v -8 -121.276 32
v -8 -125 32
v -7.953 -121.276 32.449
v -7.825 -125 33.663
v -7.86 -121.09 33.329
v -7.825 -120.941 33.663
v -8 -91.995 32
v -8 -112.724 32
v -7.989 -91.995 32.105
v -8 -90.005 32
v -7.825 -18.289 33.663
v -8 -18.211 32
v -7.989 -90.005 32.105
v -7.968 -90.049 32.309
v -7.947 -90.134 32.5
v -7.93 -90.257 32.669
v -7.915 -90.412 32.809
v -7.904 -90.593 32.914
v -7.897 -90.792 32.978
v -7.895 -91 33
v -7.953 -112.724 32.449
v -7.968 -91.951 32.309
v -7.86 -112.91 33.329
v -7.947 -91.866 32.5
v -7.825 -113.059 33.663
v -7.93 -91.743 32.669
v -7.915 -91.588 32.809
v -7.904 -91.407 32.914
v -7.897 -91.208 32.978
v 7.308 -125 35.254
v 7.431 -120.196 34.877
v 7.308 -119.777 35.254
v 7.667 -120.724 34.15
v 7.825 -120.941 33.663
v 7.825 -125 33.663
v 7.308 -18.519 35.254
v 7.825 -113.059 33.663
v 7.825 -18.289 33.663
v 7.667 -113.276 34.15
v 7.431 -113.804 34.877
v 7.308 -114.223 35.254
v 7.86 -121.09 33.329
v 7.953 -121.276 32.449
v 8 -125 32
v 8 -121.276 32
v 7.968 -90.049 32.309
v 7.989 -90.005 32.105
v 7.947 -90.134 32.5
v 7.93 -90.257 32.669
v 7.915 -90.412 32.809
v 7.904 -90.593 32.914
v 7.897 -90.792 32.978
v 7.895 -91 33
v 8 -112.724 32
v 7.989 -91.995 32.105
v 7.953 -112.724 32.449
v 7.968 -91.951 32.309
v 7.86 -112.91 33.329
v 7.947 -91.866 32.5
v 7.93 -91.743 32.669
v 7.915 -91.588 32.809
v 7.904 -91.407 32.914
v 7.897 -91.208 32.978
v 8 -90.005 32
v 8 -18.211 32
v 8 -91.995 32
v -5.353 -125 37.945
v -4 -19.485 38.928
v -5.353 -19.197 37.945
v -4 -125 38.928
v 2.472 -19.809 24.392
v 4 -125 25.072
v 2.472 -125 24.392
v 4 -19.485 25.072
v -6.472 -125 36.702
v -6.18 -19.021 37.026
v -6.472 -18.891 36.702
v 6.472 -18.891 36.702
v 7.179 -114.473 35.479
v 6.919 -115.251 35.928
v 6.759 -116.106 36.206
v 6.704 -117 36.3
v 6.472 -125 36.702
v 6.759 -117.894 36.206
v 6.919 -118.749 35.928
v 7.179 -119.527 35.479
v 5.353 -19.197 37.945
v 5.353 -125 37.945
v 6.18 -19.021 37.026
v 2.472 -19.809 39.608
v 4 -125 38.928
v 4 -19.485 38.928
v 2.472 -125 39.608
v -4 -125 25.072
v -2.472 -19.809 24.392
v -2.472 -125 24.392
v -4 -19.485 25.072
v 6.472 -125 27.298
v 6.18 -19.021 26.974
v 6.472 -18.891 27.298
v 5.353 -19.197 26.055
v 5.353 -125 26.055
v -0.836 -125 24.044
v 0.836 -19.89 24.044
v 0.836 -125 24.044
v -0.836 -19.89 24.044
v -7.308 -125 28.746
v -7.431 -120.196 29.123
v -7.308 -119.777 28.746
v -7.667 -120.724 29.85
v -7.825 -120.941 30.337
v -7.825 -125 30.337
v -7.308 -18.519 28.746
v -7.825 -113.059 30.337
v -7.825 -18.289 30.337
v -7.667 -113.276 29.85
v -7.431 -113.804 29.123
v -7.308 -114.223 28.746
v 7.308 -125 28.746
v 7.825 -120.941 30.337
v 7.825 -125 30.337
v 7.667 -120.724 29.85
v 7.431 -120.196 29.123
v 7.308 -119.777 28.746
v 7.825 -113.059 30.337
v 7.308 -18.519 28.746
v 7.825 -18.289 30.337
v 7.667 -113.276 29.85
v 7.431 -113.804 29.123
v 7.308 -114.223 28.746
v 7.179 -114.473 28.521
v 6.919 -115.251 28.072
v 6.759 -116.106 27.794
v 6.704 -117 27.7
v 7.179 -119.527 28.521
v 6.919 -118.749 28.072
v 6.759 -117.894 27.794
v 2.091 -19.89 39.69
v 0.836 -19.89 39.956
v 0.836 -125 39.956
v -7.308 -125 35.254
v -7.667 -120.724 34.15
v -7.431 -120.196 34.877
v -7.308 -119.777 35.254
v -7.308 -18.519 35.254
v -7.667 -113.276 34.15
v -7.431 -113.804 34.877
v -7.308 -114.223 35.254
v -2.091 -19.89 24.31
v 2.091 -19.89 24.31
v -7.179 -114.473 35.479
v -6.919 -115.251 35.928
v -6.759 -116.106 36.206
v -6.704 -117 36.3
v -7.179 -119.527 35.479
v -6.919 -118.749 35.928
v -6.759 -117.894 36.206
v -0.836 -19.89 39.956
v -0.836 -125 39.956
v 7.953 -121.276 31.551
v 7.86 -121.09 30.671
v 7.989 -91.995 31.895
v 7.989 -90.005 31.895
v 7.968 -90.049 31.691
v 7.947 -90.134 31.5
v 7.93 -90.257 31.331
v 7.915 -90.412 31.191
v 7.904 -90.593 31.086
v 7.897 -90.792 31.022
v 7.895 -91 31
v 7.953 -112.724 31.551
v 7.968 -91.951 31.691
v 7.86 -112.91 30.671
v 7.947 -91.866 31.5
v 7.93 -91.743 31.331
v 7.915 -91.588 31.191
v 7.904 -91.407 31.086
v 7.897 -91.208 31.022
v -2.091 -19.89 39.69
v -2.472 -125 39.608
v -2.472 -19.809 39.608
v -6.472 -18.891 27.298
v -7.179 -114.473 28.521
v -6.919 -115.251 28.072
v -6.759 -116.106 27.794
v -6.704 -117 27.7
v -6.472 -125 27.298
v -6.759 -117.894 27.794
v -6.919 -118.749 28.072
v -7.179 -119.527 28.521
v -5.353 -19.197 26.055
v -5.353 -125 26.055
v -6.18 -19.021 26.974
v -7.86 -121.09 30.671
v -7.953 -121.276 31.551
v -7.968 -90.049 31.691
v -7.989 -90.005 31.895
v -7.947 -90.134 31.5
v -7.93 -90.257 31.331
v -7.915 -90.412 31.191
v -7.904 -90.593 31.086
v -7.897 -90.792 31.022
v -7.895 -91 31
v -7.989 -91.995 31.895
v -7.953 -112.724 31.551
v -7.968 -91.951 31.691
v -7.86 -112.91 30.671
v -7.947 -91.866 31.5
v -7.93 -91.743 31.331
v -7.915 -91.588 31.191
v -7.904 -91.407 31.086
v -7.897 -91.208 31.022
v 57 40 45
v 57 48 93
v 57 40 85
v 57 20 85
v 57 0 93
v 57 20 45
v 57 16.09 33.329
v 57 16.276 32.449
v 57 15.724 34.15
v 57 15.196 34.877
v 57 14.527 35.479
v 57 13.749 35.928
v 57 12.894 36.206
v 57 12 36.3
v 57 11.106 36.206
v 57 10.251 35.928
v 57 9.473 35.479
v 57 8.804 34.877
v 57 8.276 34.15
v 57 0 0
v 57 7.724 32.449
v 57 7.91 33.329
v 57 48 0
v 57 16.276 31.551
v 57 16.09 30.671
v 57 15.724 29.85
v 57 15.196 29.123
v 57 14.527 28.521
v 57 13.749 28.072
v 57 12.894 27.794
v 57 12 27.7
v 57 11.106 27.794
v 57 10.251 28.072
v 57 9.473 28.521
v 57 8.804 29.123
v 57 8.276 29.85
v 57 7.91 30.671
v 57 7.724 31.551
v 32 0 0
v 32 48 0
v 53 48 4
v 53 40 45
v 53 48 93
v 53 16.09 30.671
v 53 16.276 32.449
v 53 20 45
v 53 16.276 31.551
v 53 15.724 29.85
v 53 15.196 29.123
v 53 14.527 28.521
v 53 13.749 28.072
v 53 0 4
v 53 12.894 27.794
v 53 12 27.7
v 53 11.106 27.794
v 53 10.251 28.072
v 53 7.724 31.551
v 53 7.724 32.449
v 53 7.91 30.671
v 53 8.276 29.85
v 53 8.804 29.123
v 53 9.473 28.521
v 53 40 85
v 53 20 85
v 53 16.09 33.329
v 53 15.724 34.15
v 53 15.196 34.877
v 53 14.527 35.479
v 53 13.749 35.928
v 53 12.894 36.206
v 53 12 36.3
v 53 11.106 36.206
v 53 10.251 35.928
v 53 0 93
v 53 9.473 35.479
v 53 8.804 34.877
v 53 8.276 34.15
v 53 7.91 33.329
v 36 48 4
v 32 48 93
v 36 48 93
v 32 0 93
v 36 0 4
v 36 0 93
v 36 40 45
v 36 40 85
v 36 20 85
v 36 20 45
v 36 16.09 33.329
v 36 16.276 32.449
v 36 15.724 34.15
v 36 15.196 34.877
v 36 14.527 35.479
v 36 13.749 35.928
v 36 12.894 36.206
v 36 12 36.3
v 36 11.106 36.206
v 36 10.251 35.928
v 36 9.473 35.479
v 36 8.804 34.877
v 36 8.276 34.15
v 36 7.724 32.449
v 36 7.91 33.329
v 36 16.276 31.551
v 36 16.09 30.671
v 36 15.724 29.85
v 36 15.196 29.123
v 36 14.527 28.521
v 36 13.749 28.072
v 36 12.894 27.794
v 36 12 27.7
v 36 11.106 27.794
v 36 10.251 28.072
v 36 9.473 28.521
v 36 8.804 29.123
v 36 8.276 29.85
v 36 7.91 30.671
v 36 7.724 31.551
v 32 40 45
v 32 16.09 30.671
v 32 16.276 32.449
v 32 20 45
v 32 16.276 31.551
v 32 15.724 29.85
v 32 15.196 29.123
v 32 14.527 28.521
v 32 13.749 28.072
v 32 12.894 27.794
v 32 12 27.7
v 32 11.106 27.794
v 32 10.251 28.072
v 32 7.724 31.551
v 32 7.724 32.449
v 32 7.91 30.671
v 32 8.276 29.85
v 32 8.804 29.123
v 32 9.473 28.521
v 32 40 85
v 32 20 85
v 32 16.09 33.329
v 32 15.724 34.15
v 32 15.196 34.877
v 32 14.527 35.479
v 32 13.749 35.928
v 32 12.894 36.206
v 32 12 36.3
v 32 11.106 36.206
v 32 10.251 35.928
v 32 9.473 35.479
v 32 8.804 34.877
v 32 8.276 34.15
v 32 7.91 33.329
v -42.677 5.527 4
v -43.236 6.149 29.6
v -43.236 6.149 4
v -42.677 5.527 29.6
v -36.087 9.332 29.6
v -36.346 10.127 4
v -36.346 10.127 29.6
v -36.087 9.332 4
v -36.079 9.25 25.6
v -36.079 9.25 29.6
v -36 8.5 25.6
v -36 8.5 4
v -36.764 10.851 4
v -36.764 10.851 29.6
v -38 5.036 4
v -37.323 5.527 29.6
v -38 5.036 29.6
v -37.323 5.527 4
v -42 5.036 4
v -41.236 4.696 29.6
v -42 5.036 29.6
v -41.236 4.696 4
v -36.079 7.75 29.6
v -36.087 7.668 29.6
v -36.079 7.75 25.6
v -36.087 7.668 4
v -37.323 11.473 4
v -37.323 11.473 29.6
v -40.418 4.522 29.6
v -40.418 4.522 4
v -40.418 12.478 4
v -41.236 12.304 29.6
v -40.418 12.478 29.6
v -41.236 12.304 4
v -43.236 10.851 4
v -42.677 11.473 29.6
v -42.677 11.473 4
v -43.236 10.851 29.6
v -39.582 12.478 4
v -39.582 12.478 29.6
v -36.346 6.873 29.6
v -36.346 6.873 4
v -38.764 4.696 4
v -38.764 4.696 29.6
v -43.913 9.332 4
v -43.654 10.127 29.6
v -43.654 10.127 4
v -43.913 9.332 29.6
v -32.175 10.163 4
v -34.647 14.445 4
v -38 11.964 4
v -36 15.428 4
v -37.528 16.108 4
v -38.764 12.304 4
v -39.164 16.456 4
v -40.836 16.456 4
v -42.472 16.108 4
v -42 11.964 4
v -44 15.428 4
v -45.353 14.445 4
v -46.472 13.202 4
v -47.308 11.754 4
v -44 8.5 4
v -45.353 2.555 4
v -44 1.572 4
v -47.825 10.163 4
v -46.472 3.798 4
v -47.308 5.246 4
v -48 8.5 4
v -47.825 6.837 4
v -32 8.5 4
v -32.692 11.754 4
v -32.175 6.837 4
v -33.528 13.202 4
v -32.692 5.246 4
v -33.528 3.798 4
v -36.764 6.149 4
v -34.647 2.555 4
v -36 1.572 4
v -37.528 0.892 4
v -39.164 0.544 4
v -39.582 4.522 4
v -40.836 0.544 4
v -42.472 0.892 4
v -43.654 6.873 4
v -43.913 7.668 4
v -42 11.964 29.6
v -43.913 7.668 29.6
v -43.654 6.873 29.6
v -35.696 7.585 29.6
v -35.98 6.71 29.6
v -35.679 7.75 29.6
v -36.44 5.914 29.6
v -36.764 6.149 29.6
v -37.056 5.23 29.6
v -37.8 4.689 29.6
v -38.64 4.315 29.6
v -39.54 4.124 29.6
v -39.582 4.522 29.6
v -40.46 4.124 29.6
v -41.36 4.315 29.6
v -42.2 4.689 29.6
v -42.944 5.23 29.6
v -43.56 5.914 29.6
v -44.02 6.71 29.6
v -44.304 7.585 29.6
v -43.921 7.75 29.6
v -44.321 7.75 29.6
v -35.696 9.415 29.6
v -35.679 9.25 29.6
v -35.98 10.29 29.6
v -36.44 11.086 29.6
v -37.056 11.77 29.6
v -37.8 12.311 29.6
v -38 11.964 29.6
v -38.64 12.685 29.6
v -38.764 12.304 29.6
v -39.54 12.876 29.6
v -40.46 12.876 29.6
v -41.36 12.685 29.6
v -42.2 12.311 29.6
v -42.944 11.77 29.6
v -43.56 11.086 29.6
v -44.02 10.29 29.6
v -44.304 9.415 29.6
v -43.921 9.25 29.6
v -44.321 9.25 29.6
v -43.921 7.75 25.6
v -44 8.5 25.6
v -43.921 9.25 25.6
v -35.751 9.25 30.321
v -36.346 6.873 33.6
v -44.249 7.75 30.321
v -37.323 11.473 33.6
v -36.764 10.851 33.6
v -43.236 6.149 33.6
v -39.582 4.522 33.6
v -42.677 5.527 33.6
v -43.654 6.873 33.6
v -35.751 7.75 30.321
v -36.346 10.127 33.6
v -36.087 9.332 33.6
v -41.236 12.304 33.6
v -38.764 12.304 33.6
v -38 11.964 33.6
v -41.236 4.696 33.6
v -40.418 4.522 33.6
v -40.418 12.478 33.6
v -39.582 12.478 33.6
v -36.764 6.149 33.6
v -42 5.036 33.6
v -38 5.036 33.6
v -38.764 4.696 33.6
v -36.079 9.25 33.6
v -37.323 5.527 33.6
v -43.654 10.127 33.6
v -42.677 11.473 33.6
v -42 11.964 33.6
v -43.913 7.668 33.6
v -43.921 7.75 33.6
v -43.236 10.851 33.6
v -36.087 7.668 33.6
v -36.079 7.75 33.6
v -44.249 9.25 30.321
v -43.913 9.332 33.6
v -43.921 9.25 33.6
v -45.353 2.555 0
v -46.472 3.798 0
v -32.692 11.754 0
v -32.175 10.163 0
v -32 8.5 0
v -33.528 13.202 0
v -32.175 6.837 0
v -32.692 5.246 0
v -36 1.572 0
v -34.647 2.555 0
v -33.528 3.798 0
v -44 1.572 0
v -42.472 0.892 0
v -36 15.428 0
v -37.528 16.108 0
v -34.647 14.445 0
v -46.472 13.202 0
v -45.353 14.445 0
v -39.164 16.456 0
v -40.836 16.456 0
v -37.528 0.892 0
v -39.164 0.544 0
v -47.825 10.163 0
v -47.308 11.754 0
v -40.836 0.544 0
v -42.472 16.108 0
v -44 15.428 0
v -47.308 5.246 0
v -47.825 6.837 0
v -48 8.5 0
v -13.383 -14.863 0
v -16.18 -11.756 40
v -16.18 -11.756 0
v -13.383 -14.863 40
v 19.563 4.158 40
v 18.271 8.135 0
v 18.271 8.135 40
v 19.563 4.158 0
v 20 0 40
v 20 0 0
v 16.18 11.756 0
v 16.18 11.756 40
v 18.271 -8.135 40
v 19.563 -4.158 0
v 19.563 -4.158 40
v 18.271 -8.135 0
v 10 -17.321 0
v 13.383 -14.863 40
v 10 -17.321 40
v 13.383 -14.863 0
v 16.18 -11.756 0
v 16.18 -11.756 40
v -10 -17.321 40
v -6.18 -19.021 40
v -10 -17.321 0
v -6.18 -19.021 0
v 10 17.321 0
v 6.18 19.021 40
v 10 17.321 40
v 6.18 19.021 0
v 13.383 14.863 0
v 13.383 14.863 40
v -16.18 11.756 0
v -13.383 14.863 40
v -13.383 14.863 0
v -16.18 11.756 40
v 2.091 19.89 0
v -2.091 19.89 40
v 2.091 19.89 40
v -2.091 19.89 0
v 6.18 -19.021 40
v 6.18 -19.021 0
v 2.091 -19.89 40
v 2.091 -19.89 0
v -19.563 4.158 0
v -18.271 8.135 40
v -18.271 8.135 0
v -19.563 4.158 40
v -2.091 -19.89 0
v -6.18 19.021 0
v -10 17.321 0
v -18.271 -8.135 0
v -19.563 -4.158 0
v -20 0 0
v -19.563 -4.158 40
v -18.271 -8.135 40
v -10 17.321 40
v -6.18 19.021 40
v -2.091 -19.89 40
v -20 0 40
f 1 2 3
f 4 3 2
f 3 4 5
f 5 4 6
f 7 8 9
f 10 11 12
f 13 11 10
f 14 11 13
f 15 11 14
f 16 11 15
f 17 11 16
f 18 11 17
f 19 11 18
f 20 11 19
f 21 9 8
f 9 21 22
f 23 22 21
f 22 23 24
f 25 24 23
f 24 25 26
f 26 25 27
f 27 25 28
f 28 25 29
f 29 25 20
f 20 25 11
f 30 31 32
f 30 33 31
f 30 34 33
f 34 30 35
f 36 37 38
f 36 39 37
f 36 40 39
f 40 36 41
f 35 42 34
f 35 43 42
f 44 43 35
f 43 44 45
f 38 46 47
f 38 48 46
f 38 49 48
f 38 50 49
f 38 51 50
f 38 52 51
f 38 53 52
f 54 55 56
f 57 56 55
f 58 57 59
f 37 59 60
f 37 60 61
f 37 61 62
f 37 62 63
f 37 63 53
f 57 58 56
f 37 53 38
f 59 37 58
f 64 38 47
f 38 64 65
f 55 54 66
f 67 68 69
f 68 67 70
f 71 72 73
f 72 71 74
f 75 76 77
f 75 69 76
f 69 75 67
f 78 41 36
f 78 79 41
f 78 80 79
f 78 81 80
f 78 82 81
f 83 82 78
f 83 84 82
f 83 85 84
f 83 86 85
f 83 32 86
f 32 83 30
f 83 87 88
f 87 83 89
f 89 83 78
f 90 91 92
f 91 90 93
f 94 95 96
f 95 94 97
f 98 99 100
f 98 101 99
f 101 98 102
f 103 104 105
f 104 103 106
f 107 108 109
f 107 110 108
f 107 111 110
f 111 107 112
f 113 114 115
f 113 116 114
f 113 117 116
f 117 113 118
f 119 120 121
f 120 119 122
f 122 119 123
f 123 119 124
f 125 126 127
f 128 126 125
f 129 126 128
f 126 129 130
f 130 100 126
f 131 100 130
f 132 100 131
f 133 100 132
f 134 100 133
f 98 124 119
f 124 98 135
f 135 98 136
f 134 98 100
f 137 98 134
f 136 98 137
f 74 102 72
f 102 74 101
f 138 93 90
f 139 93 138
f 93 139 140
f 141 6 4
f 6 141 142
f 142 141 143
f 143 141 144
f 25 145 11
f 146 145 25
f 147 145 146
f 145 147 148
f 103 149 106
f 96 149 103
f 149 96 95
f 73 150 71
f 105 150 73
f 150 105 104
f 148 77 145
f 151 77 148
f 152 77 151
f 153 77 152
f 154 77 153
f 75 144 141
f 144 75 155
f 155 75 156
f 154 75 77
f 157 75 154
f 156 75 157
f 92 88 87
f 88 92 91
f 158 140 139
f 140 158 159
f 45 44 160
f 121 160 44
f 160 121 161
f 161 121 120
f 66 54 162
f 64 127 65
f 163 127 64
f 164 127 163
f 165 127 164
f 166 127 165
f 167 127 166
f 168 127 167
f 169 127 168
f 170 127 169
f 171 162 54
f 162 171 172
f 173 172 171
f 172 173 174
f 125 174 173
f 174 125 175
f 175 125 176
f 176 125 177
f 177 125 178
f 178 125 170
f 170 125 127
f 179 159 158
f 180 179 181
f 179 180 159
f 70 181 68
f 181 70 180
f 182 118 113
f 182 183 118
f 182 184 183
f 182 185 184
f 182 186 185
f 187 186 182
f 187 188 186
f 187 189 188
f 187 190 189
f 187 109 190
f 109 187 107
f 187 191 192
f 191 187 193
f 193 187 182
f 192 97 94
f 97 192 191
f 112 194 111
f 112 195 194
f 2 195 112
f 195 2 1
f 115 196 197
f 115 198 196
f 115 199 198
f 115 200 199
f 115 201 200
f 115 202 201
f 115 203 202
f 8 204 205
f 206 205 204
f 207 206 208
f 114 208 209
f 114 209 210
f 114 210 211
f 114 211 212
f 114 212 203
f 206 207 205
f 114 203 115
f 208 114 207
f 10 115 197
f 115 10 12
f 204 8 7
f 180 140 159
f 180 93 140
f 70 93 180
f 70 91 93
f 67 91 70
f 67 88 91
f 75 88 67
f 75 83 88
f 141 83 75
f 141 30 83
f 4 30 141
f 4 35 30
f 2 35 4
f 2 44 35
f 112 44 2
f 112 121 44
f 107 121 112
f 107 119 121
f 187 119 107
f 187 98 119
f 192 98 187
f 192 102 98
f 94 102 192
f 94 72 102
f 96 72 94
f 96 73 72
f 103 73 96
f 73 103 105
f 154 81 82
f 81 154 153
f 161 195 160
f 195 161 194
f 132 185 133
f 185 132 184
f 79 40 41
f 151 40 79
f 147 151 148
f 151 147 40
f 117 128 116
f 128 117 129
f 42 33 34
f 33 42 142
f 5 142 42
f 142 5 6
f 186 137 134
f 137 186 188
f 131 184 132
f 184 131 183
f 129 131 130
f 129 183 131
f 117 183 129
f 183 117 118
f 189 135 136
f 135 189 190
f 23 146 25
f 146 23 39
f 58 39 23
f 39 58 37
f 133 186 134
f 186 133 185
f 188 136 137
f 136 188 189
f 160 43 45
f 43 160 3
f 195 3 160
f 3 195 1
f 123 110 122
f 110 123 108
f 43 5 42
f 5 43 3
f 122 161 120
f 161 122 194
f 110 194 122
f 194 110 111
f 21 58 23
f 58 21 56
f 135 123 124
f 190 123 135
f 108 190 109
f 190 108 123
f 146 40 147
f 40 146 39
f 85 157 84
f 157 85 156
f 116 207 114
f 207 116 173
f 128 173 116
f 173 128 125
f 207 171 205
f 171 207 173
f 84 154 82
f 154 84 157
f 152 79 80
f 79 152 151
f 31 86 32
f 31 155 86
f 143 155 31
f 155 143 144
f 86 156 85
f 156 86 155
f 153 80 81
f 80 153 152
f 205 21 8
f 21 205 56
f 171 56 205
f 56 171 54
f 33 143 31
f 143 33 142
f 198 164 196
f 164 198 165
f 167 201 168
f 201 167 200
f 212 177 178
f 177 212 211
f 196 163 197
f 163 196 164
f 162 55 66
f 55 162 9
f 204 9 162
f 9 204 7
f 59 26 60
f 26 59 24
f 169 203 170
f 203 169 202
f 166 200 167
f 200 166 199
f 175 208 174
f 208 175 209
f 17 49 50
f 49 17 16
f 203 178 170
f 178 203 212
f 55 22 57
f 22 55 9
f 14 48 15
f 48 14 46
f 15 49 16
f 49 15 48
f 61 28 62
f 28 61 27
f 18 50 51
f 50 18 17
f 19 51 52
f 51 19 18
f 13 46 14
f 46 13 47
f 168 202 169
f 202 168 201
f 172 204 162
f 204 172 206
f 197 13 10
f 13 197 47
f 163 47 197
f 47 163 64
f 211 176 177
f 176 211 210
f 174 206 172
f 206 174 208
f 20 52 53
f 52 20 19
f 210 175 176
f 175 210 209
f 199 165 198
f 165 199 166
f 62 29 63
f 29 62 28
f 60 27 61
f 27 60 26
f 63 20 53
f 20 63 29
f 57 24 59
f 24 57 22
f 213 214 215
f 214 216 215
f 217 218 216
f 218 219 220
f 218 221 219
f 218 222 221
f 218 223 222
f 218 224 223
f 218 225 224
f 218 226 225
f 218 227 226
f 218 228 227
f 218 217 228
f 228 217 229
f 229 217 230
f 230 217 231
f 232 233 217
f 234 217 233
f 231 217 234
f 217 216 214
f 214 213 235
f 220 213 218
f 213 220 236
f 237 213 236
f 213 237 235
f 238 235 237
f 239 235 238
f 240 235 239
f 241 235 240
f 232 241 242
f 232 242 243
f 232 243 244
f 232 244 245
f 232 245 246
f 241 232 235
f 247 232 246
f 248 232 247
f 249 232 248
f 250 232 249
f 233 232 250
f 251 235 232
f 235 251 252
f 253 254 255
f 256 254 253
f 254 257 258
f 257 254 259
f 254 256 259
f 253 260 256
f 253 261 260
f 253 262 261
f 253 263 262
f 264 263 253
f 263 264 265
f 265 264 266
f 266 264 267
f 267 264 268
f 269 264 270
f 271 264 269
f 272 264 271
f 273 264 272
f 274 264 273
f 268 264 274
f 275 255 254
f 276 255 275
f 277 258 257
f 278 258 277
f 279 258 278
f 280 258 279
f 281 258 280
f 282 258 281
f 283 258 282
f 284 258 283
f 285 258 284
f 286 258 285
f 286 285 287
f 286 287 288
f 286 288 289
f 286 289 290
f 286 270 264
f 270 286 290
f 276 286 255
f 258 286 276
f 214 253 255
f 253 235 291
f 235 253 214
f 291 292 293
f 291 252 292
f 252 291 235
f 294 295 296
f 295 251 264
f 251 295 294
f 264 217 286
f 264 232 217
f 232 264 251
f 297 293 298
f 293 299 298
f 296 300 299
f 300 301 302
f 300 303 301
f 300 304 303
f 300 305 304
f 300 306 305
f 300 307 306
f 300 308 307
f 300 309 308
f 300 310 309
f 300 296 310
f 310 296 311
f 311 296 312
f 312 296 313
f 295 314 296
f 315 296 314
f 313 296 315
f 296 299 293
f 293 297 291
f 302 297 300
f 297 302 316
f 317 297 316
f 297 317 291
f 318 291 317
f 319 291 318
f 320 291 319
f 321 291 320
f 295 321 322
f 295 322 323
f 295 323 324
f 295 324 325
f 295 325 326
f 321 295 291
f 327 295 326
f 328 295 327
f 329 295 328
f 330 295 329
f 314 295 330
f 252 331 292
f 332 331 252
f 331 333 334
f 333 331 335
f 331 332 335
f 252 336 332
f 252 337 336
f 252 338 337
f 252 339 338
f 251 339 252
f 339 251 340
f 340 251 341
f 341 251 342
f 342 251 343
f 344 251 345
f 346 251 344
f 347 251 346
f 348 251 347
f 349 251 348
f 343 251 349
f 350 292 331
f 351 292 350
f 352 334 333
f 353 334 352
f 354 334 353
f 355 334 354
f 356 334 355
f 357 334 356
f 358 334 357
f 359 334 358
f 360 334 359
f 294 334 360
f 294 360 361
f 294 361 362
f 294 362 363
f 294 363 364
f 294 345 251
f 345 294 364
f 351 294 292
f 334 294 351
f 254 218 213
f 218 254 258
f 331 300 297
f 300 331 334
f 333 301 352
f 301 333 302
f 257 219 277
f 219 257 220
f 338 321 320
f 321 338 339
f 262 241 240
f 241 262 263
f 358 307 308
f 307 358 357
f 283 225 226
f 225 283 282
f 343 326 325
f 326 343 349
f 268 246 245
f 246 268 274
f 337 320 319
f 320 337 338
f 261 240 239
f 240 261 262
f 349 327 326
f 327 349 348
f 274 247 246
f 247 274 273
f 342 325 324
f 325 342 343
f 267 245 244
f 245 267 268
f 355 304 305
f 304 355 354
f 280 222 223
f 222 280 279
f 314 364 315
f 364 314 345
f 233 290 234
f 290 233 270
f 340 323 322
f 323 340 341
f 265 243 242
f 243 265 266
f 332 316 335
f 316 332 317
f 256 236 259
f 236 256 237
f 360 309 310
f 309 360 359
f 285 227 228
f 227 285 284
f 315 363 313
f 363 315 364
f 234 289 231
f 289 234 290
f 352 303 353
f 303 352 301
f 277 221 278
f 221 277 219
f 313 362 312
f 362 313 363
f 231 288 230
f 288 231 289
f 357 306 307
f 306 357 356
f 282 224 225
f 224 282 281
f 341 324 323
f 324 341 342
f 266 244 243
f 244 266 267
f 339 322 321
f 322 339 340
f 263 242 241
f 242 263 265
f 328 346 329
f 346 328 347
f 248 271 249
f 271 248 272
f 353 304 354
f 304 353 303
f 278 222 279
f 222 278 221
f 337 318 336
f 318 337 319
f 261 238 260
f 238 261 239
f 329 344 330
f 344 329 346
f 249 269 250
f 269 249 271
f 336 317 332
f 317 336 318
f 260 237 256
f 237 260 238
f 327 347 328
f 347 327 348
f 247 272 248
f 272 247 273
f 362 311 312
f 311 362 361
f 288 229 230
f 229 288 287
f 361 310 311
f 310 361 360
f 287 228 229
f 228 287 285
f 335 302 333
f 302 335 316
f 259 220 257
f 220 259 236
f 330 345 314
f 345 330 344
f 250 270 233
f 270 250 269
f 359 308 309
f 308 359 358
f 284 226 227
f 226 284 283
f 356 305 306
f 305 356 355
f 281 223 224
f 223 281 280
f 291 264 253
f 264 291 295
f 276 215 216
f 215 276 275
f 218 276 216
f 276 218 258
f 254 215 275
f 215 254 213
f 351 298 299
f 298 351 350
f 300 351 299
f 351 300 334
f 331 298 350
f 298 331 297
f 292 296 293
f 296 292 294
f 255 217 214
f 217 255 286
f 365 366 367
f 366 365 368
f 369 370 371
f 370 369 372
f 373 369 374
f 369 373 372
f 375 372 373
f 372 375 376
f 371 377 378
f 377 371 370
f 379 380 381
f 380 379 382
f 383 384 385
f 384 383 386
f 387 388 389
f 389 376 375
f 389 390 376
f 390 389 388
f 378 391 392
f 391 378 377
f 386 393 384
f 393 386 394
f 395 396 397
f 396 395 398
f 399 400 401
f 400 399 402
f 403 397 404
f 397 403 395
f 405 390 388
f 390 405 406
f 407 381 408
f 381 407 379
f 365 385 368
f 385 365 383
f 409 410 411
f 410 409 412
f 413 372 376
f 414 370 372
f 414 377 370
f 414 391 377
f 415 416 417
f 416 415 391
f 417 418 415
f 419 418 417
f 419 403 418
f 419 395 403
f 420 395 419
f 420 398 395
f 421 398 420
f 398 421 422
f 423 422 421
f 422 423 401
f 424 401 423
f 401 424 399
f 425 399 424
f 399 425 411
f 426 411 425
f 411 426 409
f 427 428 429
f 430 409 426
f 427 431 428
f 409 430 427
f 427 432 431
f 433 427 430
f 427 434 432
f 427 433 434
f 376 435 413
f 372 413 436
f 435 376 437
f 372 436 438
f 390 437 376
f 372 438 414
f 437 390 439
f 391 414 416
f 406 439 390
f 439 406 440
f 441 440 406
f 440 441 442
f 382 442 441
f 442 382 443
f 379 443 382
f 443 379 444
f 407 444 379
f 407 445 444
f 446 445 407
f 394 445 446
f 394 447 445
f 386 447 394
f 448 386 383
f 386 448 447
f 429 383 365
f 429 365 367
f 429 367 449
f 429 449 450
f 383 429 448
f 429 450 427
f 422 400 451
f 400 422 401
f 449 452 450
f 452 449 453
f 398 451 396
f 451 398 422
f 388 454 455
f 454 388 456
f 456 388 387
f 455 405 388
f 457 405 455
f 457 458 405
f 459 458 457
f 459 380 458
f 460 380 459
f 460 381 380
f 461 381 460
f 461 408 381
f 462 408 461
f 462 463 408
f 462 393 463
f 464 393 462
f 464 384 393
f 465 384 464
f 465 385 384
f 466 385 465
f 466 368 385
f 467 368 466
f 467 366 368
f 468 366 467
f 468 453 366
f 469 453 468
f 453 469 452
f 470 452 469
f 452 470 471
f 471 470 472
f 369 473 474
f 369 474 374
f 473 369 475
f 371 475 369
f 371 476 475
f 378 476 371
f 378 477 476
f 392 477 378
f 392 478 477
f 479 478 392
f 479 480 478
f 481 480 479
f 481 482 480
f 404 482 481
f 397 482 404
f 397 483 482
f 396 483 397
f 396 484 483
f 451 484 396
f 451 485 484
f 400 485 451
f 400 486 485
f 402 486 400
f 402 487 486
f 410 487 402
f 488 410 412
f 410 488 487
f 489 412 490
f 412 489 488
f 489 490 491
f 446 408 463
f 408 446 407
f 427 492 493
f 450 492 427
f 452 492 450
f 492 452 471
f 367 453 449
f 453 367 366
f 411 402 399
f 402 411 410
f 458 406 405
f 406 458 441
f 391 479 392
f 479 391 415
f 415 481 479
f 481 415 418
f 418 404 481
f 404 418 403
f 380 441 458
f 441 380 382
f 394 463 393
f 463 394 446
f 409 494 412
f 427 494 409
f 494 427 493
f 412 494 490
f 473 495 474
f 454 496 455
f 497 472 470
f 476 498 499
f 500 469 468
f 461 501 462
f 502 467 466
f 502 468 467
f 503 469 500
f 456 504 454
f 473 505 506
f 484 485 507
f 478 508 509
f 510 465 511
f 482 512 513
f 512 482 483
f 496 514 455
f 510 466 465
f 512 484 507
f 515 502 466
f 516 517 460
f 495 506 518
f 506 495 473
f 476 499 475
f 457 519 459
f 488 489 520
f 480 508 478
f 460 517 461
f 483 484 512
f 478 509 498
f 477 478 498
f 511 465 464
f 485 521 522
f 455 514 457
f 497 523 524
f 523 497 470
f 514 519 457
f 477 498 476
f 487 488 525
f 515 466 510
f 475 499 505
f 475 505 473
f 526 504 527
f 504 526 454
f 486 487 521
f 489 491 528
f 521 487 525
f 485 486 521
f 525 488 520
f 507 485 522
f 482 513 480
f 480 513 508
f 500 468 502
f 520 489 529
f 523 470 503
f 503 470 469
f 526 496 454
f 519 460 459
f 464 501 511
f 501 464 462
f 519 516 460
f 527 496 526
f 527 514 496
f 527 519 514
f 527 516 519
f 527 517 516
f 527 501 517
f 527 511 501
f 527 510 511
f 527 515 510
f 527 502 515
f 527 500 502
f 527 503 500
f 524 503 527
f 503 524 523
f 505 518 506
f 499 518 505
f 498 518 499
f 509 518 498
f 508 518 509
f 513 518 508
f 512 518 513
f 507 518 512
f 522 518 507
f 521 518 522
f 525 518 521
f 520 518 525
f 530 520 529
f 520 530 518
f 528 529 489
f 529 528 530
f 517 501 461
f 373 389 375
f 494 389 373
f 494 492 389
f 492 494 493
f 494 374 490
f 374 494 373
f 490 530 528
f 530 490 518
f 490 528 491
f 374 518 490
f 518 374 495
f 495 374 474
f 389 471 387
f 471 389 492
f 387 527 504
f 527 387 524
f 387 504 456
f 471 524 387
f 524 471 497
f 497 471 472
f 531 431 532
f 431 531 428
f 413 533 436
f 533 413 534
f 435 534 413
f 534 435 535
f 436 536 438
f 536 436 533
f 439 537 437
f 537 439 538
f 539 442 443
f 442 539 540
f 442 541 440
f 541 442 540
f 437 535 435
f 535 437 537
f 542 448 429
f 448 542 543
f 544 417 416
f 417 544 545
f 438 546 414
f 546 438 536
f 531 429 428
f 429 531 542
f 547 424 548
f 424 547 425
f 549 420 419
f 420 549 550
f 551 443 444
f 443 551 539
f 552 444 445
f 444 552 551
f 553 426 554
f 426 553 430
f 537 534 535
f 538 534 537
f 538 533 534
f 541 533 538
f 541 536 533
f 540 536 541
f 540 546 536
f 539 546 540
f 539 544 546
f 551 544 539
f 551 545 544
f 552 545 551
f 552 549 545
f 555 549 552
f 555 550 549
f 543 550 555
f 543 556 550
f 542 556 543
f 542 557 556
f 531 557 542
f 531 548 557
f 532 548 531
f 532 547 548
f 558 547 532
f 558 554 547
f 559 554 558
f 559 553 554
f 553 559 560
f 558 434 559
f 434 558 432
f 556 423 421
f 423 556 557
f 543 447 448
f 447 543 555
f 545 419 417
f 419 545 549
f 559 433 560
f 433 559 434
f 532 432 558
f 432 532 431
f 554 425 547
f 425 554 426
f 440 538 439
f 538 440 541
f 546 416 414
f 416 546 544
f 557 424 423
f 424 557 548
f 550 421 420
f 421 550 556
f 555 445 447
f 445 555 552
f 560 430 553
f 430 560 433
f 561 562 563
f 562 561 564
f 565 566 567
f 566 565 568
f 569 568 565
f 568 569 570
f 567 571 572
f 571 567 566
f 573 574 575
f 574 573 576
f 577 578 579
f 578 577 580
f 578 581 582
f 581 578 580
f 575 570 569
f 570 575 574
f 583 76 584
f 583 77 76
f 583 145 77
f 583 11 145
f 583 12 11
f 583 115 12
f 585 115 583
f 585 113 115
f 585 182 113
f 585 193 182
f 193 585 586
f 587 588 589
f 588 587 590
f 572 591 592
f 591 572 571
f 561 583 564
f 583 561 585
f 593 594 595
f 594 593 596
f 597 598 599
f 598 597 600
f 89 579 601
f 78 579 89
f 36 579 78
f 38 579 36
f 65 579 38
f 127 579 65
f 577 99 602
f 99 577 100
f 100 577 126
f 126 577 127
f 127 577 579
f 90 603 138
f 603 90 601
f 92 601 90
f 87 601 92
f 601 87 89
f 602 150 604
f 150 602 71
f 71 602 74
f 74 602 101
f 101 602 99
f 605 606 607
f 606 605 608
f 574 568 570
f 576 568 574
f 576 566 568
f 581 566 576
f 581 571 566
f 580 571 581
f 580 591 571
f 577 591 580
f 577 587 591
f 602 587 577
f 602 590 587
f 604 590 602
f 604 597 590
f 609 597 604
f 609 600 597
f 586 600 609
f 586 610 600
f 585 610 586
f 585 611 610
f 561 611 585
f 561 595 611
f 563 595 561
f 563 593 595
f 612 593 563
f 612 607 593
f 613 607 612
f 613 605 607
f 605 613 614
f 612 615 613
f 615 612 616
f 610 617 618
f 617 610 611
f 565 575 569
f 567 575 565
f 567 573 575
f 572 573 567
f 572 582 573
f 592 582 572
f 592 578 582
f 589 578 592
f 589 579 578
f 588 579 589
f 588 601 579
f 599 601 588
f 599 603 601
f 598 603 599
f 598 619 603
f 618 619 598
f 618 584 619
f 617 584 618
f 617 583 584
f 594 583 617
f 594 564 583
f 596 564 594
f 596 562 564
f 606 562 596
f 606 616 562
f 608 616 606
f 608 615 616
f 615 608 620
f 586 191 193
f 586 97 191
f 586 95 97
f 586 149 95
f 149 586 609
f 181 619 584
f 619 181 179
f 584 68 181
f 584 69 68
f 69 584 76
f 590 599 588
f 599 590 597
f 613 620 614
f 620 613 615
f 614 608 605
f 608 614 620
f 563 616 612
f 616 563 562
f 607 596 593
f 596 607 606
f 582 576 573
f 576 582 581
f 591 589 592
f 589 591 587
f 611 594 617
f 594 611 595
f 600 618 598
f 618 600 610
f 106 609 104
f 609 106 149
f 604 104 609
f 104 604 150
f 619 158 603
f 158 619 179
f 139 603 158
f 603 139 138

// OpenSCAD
$fn=30;
handle_r = 8;
handle_l = 125;
head_r = 20;
head_l = 40;
pin_r = 4;
pin_rtol = 0.3;   // gap between pin and the hole
pin_ltol = 0.3;  // gap betwen the pin ends and the hinge
pin_head_r = pin_r * 2;
pin_head_l = 4;
hinge_t = 4;
hinge_tol = 0.5; // gap between the hinge and the handle
hinge_pin_y = pin_r*3;
servo_arm_l = 13;
drive_hole_r = 1;
barb_l = 4;
barb_r = 0.1;
slot_t = 1.5;
slot_l = barb_l + 4;



explode = 1;  //  set to 1 to print, 0 to see assembly

diff_tol = 1; // tolerance for diff operations

pin_l = handle_r*2 + hinge_tol*2 + hinge_t * 2 + pin_ltol*2;  // just the shaft part
pin_offset = pin_r * 2;
handle_z = head_l-handle_r;
pin_y = -handle_l + pin_offset;

servo_l = 40;
servo_w = 20;
servo_z = handle_z + handle_r + 5;
servo_y = hinge_pin_y + handle_r;
servo_oh = 8;

/***** hammer *****/
// head
cylinder( r = head_r, h = head_l);
// handle
difference() {
    // handle itself
    translate( [0, 0, handle_z ] )                             rotate( [90,0,0])  cylinder( r = handle_r, h = handle_l);
    // hold for pin
    translate( [-pin_l/2, pin_y, handle_z] )                   rotate( [0,90,0] ) cylinder( r=pin_r+pin_rtol, h=pin_l);
    // drive hole
    translate( [-pin_l/2, pin_y + servo_arm_l * 2, handle_z] ) rotate( [0,90,0] ) cylinder( r=drive_hole_r, h=pin_l);
    
}

/**** hinge ****/
hinge_w = handle_r*2 + hinge_tol * 2;  // inner
hinge_l = servo_y+servo_w+servo_oh;
hinge_y = pin_y - hinge_w /2 ;
color("blue") translate( [explode*head_r*3 - hinge_l/2, (1-explode) * hinge_y,0 ] ) {
    
    // base
                                                                             cube([hinge_w,hinge_l,hinge_t]);
    difference() {
        union() {
            translate( [hinge_w, 0,0])                                       cube( [hinge_t, hinge_l, handle_z] );
            translate( [-hinge_t, 0,0])                                      cube( [hinge_t, hinge_l, handle_z] );
            // sides
//            translate( [hinge_w, hinge_w/2, handle_z] )  rotate( [0,90,0])   cylinder( r=hinge_w/2, h=hinge_t);
//            translate( [-hinge_t, hinge_w/2, handle_z] ) rotate( [0,90,0])   cylinder( r=hinge_w/2, h=hinge_t);
            translate( [hinge_w, 0, handle_z] )                      cube( [hinge_t, hinge_l, servo_z - handle_z]);
            translate( [-hinge_t, 0, handle_z] )                     cube( [hinge_t, hinge_l, servo_z - handle_z]);
        }
        // hole for pin
        translate( [-hinge_t, hinge_pin_y, handle_z] )     rotate( [0,90,0])   cylinder( r=pin_r + pin_rtol, h=pin_l);
        
    }
    // servo_holder
    translate( [hinge_w,0,servo_z])                                             cube( [hinge_t, servo_y, servo_l] ) ;
    translate( [hinge_w,servo_y+servo_w,servo_z])                               cube( [hinge_t, servo_oh, servo_l] ) ;
    translate( [-hinge_t,0,servo_z])                                            cube( [hinge_t, servo_y, servo_l] ) ;
    translate( [-hinge_t,servo_y+servo_w,servo_z])                              cube( [hinge_t, servo_oh, servo_l] ) ;
    translate( [-hinge_t,0, servo_z + servo_l])                                 cube( [hinge_t, servo_y + servo_w + servo_oh, servo_oh] ) ;
    translate( [ hinge_w,0, servo_z + servo_l])                                 cube( [hinge_t, servo_y + servo_w + servo_oh, servo_oh] ) ;
   
}


/**** pin ****/
translate( [ -explode*head_r*2 + (1-explode) * -(pin_l/2 + pin_head_l ), (1-explode) * hinge_y + hinge_w/2, (1-explode)*handle_z] ) rotate( [0, 90*(1-explode), 0] )  {
    // pin head
    cylinder( r=pin_head_r, h=pin_head_l) sphere( r=0.5);
    difference() {
        union() {
            // pin shaft
            translate( [ 0,0, pin_head_l] ) cylinder( r=pin_r, h=pin_l) sphere( 0.5);
            // pin barb
            translate( [0,0,pin_head_l + pin_l] ) cylinder( r1=pin_r+barb_r+pin_rtol, r2=pin_r,h=barb_l );
        }
        // slot
        translate( [-pin_r-barb_r-pin_rtol,-slot_t/2, pin_l+pin_head_l+barb_l-slot_l]) color("red") cube( [pin_r*2+barb_r*2+pin_rtol*2, slot_t, slot_l] ) ;
    }
    
}
